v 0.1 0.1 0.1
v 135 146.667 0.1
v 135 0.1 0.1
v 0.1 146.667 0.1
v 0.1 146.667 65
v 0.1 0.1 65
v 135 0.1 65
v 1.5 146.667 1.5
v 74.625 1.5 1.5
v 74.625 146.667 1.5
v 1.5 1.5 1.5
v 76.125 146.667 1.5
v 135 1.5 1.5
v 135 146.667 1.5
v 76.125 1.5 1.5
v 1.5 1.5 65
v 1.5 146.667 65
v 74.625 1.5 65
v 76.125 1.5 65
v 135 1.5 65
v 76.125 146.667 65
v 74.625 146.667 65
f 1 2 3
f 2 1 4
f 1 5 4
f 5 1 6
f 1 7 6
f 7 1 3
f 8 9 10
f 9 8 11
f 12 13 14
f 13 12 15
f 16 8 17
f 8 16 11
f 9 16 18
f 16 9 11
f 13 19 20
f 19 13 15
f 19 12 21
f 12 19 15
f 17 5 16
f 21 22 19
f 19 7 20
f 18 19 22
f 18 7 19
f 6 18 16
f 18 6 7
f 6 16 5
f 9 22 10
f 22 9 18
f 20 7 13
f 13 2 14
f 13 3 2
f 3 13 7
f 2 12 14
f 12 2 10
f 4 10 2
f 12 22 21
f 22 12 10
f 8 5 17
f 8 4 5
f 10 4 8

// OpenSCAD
external_width = 300;
external_height = 440;
external_depth = 65;
wall_thickness = 1.5;
width = external_width - wall_thickness * 2;
height = external_height - wall_thickness * 2;
depth = external_depth - wall_thickness;

part = 0;

$fn = 30;

module compartiments()
{
    difference()
    {
        translate([ wall_thickness, wall_thickness, wall_thickness ])
        {
            difference()
            {
                translate([ -wall_thickness + .1, -wall_thickness + .1, -wall_thickness + .1 ])
                    cube([ external_width, external_height, external_depth ]);
                cube([ width, height, depth + 1 ]);
            }

            w = (width - wall_thickness * 3) / 4;
            h = height / 4 - wall_thickness;
            for (i = [1:3])
            {
                translate([ w * i + wall_thickness * (i - 1), 0, 0 ])
                {
                    cube([ wall_thickness, i == 1 ? height : height - h, depth ]);
                }
            }

            translate([ w, height - h, 0 ])
            {
                cube([ width - w, wall_thickness, depth ]);
            }
        }
        chanfrein = wall_thickness * 0;
        rotate([ 0, 45, 0 ]) translate([ -chanfrein / 2, 0, -chanfrein / 2 ])
            cube([ chanfrein, external_height + 1, chanfrein ]);
        rotate([ 0, 45, 90 ]) translate([ -chanfrein / 2, -external_width, -chanfrein / 2 ])
            cube([ chanfrein, external_width + 1, chanfrein ]);
        translate([ external_width, 0, 0 ]) rotate([ 0, 45, 0 ]) translate([ -chanfrein / 2, 0, -chanfrein / 2 ])
            cube([ chanfrein, external_height + 1, chanfrein ]);
        translate([ 0, external_height, 0 ]) rotate([ 0, 45, 90 ])
            translate([ -chanfrein / 2, -external_width, -chanfrein / 2 ])
                cube([ chanfrein, external_width + 1, chanfrein ]);
    }
}

// compartiments();
if (part < 3)
{
    intersection()
    {
        translate([ 0, -external_height / 3 * part, 0 ]) #compartiments();
        cube([ external_width * .45, external_height / 3, external_depth ]);
    }
}
else
{
    intersection()
    {
        translate([ -external_width * .45, -external_height / 3 * (part - 3), 0 ]) #compartiments();
        cube([ external_width * .65, external_height / 3, external_depth ]);
    }
}
